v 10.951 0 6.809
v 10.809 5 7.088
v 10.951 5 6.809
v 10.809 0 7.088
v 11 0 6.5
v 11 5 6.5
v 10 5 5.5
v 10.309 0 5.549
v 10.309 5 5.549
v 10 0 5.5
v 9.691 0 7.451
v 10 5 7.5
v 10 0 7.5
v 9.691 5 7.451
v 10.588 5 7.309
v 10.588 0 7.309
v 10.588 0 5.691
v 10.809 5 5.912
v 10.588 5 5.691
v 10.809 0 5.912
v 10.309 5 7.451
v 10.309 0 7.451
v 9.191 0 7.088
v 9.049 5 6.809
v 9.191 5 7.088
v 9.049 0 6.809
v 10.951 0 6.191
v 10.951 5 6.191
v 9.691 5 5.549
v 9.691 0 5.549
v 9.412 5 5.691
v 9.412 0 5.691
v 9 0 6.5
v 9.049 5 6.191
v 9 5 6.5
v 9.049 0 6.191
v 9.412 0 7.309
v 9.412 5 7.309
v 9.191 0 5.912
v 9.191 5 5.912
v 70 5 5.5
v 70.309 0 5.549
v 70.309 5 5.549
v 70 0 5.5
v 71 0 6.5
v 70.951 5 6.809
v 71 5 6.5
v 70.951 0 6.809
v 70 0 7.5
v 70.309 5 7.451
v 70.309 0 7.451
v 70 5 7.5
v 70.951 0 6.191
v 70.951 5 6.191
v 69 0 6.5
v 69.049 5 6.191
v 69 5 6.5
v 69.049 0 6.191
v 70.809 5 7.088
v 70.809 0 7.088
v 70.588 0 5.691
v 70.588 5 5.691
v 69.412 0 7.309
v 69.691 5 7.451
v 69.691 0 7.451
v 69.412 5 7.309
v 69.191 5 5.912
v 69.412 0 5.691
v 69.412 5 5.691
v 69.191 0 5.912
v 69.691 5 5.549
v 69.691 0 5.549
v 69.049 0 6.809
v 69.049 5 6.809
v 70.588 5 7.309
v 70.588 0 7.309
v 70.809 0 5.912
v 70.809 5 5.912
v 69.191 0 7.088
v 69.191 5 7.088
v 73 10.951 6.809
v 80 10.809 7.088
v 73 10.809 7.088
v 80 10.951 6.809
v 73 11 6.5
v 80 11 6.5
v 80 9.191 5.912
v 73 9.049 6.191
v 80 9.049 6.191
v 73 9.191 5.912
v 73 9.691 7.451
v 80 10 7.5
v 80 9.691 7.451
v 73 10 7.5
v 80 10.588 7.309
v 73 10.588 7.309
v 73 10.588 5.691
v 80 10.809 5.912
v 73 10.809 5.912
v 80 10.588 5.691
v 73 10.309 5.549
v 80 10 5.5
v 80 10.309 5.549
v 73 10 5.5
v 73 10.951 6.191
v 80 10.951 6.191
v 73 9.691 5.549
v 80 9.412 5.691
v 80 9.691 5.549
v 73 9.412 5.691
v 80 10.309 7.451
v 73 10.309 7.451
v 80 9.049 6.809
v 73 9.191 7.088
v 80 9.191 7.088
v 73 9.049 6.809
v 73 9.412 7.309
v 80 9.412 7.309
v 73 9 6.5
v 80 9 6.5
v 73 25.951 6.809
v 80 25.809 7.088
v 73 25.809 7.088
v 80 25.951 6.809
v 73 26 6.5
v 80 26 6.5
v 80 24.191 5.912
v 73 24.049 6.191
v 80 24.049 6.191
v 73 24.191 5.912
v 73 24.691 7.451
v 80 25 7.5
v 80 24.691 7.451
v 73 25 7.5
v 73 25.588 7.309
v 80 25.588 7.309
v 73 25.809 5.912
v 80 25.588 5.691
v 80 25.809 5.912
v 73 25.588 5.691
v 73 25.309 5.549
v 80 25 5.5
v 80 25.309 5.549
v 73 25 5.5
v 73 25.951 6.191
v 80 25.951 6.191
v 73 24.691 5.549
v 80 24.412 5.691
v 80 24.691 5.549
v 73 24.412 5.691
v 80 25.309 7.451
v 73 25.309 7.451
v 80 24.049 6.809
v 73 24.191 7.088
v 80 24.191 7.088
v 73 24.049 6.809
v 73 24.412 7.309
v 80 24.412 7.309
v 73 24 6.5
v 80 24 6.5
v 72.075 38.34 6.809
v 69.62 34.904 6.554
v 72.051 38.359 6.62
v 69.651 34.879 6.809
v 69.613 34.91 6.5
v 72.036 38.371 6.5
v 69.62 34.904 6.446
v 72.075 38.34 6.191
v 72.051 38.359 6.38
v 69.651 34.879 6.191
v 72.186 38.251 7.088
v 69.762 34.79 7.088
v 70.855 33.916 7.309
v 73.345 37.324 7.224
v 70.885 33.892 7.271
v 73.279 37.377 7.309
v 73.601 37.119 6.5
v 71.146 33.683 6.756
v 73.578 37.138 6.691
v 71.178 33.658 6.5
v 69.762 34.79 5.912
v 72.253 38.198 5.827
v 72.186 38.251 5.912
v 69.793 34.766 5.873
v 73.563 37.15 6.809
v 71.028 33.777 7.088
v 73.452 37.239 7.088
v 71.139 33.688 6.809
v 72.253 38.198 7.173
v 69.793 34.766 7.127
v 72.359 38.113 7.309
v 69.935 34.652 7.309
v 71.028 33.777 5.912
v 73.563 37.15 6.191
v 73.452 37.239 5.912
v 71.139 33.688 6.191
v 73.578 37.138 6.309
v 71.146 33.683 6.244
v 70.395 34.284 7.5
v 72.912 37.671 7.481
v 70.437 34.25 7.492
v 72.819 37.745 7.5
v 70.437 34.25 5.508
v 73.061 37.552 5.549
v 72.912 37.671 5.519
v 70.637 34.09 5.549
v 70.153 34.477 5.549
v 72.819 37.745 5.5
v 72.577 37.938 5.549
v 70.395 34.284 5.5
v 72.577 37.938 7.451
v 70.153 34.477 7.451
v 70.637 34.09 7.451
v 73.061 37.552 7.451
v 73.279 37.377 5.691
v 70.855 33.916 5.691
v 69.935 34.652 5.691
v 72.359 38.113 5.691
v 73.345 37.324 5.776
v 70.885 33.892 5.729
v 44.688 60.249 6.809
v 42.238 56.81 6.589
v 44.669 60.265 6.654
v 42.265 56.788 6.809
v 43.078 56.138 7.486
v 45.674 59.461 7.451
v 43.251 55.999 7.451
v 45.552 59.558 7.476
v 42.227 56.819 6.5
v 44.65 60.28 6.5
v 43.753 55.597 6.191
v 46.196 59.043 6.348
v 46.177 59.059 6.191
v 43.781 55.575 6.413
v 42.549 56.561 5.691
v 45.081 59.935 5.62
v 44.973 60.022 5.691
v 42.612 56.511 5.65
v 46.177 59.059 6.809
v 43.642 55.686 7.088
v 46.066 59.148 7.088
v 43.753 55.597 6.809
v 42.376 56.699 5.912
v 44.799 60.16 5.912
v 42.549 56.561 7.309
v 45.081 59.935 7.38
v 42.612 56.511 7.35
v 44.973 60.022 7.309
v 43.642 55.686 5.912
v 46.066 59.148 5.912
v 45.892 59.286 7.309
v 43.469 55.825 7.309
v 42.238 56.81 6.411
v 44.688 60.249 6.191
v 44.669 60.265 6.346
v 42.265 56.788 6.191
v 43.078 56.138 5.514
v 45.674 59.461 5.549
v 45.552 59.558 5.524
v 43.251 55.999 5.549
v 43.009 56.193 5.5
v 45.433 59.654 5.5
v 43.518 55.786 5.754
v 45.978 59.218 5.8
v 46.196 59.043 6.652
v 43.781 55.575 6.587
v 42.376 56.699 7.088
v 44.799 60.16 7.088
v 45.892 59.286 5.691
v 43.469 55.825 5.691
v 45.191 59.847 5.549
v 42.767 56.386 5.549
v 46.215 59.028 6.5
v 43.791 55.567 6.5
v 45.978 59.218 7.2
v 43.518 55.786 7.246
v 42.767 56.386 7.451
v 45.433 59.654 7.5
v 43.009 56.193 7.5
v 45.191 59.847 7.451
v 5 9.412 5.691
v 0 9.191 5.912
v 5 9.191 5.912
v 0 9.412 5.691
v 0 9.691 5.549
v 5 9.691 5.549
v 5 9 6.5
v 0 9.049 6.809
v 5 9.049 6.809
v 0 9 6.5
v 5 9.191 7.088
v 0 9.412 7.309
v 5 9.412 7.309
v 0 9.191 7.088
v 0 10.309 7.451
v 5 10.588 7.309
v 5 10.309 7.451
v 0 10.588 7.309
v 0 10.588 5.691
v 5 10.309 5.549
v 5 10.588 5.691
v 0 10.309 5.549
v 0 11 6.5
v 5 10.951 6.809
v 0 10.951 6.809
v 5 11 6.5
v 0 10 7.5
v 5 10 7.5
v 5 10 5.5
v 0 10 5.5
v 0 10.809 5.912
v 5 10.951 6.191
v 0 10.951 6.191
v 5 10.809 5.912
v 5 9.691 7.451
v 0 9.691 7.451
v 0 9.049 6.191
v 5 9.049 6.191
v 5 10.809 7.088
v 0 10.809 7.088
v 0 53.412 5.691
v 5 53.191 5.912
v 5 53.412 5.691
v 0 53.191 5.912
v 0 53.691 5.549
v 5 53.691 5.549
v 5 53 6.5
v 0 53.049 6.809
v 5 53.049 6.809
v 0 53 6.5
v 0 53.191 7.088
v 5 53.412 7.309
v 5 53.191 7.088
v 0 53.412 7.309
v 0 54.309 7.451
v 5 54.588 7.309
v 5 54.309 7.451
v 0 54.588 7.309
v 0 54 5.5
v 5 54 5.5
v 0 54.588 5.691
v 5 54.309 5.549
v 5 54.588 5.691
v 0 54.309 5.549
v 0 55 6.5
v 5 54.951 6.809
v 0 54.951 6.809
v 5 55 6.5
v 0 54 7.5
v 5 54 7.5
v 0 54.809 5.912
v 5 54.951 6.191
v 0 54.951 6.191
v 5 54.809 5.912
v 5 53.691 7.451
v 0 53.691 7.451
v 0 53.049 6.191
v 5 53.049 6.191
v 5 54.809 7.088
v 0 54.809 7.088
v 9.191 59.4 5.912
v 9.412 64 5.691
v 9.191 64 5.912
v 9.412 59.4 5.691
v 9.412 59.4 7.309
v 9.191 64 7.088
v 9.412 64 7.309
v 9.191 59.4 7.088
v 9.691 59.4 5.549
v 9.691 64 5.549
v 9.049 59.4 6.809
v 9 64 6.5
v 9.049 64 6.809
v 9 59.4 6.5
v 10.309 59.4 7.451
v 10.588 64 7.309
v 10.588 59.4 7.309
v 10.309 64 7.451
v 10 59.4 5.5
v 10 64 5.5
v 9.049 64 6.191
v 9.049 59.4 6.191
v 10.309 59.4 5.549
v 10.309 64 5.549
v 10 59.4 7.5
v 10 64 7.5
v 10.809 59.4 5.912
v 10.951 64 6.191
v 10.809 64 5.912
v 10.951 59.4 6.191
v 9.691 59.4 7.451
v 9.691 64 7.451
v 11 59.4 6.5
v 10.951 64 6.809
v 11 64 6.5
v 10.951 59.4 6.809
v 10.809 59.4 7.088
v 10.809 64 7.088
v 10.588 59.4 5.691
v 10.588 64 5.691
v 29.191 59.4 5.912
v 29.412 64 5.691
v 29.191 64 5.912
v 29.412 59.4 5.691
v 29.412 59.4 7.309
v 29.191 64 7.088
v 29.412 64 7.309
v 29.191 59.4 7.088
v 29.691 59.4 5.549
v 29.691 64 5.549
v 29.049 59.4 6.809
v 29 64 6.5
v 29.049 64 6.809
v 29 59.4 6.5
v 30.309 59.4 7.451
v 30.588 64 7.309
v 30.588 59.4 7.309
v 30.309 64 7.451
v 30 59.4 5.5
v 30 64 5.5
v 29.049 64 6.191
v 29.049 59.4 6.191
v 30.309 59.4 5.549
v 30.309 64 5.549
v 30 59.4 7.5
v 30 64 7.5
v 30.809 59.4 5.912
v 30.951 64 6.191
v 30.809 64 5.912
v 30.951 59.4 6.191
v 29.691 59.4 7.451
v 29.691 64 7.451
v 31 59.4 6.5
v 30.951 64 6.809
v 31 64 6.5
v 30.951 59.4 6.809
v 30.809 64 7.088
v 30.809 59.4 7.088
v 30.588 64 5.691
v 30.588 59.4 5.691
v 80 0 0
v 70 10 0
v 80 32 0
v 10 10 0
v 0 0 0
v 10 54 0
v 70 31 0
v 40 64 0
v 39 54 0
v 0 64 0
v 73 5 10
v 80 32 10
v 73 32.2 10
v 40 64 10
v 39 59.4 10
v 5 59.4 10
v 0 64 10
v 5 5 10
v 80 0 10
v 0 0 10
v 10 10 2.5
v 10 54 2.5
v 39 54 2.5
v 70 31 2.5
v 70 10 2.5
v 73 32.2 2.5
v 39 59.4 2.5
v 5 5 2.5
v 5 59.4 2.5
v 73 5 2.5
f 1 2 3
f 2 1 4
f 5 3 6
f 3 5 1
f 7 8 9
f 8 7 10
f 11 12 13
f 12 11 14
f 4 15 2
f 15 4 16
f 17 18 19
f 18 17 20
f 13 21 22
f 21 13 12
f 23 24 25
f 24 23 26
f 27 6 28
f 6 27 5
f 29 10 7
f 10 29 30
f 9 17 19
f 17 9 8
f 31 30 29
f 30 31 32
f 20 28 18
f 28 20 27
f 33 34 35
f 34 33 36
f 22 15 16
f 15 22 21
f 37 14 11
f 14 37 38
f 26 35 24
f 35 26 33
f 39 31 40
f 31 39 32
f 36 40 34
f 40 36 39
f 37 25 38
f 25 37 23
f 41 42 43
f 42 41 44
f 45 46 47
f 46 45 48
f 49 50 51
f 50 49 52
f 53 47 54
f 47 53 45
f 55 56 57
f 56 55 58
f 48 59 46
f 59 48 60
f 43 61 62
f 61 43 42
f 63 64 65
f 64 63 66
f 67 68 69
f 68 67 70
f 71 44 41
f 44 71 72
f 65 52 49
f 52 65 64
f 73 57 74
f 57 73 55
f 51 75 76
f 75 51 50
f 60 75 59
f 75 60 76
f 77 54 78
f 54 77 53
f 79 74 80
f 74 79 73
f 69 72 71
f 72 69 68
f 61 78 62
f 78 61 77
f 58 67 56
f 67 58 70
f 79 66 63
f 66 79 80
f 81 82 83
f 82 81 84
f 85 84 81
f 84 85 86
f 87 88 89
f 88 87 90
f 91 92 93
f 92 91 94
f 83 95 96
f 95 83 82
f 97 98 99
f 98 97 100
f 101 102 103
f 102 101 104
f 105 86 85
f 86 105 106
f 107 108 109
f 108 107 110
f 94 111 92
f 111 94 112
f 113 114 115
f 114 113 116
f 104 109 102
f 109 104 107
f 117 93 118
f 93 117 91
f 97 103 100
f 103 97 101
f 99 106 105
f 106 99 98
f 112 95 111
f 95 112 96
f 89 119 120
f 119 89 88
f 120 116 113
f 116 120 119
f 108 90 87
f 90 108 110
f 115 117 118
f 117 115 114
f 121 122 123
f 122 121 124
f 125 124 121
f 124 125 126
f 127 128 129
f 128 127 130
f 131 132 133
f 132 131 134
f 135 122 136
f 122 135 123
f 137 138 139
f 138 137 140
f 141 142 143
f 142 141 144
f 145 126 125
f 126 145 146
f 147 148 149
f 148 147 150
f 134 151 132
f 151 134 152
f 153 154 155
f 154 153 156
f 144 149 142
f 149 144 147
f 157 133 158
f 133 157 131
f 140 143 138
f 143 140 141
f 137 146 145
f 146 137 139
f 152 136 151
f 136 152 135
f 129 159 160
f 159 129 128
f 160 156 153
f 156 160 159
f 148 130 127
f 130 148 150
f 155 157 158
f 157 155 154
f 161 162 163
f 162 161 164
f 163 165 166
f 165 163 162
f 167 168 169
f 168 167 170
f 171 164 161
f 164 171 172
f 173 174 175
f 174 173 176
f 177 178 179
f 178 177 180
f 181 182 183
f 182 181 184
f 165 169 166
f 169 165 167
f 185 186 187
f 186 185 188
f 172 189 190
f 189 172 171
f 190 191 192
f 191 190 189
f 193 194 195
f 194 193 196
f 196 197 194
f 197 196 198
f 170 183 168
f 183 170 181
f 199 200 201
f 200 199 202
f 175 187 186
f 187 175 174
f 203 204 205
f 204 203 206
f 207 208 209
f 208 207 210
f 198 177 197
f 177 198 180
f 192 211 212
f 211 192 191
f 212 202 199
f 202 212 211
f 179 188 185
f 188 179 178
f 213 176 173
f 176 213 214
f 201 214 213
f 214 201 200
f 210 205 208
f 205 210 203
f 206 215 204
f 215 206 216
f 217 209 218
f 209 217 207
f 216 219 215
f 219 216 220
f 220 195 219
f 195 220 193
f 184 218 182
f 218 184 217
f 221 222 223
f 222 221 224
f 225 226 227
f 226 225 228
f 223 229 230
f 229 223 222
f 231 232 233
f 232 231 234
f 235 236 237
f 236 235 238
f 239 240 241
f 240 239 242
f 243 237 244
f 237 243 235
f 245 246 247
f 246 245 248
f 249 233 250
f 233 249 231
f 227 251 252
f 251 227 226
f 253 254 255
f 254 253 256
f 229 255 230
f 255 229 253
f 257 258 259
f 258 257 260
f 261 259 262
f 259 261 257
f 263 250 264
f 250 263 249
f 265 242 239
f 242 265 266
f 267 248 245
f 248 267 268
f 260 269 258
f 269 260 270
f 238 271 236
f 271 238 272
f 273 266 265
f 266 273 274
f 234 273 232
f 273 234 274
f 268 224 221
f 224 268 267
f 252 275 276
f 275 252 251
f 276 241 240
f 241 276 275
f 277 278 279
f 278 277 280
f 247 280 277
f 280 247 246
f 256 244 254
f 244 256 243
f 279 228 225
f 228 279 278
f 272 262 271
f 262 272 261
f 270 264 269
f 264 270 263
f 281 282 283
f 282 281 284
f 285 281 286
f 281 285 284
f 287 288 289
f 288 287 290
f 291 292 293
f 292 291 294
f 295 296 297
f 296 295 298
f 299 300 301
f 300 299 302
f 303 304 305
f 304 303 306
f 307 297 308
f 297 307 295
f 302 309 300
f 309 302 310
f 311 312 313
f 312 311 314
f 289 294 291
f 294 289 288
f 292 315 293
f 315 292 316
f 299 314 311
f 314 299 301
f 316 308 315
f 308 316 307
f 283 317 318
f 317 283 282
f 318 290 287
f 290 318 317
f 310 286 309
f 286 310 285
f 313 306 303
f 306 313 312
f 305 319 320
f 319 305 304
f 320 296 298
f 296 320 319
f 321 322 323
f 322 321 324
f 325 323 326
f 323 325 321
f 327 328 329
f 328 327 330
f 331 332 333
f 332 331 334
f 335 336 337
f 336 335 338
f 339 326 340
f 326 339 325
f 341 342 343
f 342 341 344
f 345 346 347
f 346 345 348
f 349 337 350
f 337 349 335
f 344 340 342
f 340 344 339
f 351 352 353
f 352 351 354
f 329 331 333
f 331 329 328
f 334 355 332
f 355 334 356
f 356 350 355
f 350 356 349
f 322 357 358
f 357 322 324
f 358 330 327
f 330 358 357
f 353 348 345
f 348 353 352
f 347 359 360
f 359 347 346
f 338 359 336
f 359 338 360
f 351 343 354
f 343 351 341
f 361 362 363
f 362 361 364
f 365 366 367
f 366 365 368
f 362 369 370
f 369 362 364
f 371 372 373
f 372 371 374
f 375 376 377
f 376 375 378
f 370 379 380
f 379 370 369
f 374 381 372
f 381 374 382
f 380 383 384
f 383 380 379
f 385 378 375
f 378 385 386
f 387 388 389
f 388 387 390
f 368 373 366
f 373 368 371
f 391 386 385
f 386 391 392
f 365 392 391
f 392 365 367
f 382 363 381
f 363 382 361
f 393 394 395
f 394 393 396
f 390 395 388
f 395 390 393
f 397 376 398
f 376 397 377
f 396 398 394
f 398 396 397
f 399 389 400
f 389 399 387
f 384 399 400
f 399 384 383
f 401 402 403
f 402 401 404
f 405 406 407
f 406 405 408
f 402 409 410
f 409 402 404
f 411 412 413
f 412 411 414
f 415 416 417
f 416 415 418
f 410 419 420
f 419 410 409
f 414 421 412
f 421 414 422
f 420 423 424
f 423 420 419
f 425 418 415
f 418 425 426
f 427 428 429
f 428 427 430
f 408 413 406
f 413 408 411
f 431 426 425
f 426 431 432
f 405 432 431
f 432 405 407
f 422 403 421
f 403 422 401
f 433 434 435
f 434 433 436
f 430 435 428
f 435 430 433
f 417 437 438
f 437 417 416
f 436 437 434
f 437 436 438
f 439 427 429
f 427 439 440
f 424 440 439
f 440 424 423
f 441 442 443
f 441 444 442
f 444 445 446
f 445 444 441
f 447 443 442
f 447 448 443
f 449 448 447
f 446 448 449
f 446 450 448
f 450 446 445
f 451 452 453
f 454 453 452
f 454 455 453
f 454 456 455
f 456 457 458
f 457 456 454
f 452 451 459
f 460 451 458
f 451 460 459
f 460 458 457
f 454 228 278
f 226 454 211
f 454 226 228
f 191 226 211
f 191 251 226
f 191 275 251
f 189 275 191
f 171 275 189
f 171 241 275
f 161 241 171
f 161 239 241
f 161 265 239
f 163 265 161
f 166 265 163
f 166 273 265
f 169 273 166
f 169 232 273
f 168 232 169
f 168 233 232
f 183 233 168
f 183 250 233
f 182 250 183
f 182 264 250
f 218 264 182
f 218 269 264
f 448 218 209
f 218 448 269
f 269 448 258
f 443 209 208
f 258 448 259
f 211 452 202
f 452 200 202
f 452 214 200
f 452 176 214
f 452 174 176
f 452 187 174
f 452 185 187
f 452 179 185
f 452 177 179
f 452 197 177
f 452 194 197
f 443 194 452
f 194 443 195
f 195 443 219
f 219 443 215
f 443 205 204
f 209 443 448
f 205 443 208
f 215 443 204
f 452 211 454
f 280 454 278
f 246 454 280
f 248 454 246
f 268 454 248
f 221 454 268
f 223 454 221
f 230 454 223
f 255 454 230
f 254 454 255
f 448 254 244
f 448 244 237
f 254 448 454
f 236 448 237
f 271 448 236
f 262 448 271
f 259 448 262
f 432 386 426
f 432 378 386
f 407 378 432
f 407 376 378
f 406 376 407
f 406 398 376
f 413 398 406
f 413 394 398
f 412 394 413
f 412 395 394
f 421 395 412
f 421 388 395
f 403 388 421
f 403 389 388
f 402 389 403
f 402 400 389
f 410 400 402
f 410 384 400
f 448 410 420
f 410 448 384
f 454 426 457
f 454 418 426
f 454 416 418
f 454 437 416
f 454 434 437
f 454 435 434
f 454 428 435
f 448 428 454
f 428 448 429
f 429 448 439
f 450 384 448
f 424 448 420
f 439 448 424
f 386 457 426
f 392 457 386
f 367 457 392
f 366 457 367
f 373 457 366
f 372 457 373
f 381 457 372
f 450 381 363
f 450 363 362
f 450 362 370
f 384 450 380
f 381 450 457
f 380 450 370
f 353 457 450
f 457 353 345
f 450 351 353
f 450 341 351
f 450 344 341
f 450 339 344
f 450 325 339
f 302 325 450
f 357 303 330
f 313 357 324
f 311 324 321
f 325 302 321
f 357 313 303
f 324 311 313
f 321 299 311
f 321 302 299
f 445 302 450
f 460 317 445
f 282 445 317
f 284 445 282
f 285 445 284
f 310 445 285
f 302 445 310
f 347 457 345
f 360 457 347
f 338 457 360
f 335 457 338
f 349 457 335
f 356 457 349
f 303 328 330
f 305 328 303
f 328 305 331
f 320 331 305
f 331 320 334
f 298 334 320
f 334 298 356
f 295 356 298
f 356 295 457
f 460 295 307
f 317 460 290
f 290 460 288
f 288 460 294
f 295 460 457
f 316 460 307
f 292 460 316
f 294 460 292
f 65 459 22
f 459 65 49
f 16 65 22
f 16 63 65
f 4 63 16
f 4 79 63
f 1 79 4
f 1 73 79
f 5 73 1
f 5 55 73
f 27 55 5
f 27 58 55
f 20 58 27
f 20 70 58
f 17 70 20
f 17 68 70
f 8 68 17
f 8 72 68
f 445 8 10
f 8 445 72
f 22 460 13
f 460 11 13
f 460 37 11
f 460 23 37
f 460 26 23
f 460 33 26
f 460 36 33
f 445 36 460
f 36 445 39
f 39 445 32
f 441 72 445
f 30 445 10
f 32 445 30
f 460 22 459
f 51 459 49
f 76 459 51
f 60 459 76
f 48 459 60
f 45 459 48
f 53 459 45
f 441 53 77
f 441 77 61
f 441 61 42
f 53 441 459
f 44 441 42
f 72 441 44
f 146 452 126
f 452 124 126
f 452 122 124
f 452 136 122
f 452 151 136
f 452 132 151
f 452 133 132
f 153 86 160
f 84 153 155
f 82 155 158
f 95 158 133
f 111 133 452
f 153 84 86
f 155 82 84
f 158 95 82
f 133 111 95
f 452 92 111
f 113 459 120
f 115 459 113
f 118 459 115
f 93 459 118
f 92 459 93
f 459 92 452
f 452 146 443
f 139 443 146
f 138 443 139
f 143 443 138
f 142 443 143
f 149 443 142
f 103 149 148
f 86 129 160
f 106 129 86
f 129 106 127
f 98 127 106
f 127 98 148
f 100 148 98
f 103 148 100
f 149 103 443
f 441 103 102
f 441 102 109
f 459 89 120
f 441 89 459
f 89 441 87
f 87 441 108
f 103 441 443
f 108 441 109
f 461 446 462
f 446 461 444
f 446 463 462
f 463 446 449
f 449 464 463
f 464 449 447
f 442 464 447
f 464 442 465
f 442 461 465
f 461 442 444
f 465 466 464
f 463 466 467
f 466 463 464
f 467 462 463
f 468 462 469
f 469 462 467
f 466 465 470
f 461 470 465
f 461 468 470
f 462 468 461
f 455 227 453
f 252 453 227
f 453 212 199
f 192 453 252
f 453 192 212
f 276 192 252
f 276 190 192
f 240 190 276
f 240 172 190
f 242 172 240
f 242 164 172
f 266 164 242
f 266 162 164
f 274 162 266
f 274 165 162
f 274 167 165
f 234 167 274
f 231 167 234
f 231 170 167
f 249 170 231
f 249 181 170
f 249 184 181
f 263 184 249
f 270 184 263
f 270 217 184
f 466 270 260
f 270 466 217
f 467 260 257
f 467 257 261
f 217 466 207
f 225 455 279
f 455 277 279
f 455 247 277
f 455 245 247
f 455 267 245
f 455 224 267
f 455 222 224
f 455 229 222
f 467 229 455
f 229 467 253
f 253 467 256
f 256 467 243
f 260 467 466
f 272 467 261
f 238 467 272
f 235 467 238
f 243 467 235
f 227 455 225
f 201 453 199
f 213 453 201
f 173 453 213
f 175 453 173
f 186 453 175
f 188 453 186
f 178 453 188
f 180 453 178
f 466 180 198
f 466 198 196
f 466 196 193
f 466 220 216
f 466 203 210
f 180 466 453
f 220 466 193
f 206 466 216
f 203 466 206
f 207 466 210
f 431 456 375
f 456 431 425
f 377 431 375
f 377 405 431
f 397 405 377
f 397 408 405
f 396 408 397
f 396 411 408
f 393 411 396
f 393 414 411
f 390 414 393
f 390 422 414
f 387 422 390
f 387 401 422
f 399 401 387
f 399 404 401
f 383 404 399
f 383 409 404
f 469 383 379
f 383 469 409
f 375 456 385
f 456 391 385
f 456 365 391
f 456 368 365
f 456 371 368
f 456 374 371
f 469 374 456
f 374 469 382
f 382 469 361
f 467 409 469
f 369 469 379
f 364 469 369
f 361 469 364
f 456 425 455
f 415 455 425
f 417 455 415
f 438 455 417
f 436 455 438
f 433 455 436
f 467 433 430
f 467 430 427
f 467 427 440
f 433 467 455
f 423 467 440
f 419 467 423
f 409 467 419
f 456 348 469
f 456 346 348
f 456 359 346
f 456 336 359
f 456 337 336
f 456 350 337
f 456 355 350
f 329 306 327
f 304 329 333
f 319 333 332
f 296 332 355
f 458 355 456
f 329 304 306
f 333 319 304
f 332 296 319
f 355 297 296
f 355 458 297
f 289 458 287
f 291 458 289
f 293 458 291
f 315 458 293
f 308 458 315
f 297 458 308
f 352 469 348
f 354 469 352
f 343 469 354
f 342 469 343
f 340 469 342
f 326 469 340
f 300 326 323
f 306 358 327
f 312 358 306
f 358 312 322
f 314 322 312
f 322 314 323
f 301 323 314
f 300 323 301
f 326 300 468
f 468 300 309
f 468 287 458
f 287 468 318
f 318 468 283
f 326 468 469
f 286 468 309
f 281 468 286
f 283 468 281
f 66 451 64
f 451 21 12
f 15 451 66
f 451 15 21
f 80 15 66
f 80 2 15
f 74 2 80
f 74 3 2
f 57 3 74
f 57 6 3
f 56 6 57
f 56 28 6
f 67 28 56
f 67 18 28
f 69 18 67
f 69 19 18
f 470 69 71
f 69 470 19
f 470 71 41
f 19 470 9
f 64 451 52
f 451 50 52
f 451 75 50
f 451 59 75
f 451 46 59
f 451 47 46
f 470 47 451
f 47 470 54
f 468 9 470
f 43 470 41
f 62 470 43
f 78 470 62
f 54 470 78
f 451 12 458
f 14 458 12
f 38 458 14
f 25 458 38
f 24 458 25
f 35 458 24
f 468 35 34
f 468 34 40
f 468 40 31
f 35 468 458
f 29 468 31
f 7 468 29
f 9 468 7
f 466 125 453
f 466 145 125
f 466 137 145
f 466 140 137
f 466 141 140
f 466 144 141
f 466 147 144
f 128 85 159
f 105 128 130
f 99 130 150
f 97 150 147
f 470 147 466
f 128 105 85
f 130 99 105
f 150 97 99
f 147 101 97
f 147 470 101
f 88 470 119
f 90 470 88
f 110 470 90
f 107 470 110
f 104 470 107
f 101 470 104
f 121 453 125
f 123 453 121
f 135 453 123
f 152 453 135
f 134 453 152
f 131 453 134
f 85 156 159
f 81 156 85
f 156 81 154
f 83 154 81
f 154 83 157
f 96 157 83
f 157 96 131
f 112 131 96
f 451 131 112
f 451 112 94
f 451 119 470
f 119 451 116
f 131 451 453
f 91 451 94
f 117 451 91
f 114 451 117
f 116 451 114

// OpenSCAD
height = 64;
top_width = 40;
base_width = 80;

thickness = 10;

nudge = 1;
module start_side(){
  linear_extrude(height=10)polygon(points=[
					   [0, 0],
					   [0, height],
					   [top_width, height],
					   [base_width, height/2],
					   [base_width, 0],

					   [thickness, thickness],
					   [thickness, height - thickness],
					   [top_width - nudge, height - thickness],
					   [base_width - thickness, height/2 - nudge],
					   [base_width - thickness, thickness],

					   ],
				   paths = [[0, 1, 2, 3, 4], [5, 6, 7, 8, 9]]);
}

module screw(){
  translate([0, 10, 6.5])rotate([90, 0, 0])cylinder(h=20, d=2, $fn=20);
}

module holes(){
  // bottom
  translate([10, 0, 0])screw();
  translate([70, 0, 0])screw();

  //front
  translate([80, 10, 0])rotate([0, 0, 90])screw();
  translate([80, 25, 0])rotate([0, 0, 90])screw();

  //diag
  rotate([0, 0, 145])translate([-38, -75, 0])screw();
  rotate([0, 0, 145])translate([-3, -75, 0])screw();

  // back
  translate([0, 10, 0])rotate([0, 0, -90])screw();
  translate([0, height-10, 0])rotate([0, 0, -90])screw();

  // top
  #translate([10, height, 0])rotate([0, 0, 180])screw();
  #translate([top_width-10, height, 0])rotate([0, 0, 180])screw();
}

difference(){
  start_side();
  translate([thickness/2, thickness/2, thickness/4])scale([.85, .85, 2])start_side();
  holes();
}
